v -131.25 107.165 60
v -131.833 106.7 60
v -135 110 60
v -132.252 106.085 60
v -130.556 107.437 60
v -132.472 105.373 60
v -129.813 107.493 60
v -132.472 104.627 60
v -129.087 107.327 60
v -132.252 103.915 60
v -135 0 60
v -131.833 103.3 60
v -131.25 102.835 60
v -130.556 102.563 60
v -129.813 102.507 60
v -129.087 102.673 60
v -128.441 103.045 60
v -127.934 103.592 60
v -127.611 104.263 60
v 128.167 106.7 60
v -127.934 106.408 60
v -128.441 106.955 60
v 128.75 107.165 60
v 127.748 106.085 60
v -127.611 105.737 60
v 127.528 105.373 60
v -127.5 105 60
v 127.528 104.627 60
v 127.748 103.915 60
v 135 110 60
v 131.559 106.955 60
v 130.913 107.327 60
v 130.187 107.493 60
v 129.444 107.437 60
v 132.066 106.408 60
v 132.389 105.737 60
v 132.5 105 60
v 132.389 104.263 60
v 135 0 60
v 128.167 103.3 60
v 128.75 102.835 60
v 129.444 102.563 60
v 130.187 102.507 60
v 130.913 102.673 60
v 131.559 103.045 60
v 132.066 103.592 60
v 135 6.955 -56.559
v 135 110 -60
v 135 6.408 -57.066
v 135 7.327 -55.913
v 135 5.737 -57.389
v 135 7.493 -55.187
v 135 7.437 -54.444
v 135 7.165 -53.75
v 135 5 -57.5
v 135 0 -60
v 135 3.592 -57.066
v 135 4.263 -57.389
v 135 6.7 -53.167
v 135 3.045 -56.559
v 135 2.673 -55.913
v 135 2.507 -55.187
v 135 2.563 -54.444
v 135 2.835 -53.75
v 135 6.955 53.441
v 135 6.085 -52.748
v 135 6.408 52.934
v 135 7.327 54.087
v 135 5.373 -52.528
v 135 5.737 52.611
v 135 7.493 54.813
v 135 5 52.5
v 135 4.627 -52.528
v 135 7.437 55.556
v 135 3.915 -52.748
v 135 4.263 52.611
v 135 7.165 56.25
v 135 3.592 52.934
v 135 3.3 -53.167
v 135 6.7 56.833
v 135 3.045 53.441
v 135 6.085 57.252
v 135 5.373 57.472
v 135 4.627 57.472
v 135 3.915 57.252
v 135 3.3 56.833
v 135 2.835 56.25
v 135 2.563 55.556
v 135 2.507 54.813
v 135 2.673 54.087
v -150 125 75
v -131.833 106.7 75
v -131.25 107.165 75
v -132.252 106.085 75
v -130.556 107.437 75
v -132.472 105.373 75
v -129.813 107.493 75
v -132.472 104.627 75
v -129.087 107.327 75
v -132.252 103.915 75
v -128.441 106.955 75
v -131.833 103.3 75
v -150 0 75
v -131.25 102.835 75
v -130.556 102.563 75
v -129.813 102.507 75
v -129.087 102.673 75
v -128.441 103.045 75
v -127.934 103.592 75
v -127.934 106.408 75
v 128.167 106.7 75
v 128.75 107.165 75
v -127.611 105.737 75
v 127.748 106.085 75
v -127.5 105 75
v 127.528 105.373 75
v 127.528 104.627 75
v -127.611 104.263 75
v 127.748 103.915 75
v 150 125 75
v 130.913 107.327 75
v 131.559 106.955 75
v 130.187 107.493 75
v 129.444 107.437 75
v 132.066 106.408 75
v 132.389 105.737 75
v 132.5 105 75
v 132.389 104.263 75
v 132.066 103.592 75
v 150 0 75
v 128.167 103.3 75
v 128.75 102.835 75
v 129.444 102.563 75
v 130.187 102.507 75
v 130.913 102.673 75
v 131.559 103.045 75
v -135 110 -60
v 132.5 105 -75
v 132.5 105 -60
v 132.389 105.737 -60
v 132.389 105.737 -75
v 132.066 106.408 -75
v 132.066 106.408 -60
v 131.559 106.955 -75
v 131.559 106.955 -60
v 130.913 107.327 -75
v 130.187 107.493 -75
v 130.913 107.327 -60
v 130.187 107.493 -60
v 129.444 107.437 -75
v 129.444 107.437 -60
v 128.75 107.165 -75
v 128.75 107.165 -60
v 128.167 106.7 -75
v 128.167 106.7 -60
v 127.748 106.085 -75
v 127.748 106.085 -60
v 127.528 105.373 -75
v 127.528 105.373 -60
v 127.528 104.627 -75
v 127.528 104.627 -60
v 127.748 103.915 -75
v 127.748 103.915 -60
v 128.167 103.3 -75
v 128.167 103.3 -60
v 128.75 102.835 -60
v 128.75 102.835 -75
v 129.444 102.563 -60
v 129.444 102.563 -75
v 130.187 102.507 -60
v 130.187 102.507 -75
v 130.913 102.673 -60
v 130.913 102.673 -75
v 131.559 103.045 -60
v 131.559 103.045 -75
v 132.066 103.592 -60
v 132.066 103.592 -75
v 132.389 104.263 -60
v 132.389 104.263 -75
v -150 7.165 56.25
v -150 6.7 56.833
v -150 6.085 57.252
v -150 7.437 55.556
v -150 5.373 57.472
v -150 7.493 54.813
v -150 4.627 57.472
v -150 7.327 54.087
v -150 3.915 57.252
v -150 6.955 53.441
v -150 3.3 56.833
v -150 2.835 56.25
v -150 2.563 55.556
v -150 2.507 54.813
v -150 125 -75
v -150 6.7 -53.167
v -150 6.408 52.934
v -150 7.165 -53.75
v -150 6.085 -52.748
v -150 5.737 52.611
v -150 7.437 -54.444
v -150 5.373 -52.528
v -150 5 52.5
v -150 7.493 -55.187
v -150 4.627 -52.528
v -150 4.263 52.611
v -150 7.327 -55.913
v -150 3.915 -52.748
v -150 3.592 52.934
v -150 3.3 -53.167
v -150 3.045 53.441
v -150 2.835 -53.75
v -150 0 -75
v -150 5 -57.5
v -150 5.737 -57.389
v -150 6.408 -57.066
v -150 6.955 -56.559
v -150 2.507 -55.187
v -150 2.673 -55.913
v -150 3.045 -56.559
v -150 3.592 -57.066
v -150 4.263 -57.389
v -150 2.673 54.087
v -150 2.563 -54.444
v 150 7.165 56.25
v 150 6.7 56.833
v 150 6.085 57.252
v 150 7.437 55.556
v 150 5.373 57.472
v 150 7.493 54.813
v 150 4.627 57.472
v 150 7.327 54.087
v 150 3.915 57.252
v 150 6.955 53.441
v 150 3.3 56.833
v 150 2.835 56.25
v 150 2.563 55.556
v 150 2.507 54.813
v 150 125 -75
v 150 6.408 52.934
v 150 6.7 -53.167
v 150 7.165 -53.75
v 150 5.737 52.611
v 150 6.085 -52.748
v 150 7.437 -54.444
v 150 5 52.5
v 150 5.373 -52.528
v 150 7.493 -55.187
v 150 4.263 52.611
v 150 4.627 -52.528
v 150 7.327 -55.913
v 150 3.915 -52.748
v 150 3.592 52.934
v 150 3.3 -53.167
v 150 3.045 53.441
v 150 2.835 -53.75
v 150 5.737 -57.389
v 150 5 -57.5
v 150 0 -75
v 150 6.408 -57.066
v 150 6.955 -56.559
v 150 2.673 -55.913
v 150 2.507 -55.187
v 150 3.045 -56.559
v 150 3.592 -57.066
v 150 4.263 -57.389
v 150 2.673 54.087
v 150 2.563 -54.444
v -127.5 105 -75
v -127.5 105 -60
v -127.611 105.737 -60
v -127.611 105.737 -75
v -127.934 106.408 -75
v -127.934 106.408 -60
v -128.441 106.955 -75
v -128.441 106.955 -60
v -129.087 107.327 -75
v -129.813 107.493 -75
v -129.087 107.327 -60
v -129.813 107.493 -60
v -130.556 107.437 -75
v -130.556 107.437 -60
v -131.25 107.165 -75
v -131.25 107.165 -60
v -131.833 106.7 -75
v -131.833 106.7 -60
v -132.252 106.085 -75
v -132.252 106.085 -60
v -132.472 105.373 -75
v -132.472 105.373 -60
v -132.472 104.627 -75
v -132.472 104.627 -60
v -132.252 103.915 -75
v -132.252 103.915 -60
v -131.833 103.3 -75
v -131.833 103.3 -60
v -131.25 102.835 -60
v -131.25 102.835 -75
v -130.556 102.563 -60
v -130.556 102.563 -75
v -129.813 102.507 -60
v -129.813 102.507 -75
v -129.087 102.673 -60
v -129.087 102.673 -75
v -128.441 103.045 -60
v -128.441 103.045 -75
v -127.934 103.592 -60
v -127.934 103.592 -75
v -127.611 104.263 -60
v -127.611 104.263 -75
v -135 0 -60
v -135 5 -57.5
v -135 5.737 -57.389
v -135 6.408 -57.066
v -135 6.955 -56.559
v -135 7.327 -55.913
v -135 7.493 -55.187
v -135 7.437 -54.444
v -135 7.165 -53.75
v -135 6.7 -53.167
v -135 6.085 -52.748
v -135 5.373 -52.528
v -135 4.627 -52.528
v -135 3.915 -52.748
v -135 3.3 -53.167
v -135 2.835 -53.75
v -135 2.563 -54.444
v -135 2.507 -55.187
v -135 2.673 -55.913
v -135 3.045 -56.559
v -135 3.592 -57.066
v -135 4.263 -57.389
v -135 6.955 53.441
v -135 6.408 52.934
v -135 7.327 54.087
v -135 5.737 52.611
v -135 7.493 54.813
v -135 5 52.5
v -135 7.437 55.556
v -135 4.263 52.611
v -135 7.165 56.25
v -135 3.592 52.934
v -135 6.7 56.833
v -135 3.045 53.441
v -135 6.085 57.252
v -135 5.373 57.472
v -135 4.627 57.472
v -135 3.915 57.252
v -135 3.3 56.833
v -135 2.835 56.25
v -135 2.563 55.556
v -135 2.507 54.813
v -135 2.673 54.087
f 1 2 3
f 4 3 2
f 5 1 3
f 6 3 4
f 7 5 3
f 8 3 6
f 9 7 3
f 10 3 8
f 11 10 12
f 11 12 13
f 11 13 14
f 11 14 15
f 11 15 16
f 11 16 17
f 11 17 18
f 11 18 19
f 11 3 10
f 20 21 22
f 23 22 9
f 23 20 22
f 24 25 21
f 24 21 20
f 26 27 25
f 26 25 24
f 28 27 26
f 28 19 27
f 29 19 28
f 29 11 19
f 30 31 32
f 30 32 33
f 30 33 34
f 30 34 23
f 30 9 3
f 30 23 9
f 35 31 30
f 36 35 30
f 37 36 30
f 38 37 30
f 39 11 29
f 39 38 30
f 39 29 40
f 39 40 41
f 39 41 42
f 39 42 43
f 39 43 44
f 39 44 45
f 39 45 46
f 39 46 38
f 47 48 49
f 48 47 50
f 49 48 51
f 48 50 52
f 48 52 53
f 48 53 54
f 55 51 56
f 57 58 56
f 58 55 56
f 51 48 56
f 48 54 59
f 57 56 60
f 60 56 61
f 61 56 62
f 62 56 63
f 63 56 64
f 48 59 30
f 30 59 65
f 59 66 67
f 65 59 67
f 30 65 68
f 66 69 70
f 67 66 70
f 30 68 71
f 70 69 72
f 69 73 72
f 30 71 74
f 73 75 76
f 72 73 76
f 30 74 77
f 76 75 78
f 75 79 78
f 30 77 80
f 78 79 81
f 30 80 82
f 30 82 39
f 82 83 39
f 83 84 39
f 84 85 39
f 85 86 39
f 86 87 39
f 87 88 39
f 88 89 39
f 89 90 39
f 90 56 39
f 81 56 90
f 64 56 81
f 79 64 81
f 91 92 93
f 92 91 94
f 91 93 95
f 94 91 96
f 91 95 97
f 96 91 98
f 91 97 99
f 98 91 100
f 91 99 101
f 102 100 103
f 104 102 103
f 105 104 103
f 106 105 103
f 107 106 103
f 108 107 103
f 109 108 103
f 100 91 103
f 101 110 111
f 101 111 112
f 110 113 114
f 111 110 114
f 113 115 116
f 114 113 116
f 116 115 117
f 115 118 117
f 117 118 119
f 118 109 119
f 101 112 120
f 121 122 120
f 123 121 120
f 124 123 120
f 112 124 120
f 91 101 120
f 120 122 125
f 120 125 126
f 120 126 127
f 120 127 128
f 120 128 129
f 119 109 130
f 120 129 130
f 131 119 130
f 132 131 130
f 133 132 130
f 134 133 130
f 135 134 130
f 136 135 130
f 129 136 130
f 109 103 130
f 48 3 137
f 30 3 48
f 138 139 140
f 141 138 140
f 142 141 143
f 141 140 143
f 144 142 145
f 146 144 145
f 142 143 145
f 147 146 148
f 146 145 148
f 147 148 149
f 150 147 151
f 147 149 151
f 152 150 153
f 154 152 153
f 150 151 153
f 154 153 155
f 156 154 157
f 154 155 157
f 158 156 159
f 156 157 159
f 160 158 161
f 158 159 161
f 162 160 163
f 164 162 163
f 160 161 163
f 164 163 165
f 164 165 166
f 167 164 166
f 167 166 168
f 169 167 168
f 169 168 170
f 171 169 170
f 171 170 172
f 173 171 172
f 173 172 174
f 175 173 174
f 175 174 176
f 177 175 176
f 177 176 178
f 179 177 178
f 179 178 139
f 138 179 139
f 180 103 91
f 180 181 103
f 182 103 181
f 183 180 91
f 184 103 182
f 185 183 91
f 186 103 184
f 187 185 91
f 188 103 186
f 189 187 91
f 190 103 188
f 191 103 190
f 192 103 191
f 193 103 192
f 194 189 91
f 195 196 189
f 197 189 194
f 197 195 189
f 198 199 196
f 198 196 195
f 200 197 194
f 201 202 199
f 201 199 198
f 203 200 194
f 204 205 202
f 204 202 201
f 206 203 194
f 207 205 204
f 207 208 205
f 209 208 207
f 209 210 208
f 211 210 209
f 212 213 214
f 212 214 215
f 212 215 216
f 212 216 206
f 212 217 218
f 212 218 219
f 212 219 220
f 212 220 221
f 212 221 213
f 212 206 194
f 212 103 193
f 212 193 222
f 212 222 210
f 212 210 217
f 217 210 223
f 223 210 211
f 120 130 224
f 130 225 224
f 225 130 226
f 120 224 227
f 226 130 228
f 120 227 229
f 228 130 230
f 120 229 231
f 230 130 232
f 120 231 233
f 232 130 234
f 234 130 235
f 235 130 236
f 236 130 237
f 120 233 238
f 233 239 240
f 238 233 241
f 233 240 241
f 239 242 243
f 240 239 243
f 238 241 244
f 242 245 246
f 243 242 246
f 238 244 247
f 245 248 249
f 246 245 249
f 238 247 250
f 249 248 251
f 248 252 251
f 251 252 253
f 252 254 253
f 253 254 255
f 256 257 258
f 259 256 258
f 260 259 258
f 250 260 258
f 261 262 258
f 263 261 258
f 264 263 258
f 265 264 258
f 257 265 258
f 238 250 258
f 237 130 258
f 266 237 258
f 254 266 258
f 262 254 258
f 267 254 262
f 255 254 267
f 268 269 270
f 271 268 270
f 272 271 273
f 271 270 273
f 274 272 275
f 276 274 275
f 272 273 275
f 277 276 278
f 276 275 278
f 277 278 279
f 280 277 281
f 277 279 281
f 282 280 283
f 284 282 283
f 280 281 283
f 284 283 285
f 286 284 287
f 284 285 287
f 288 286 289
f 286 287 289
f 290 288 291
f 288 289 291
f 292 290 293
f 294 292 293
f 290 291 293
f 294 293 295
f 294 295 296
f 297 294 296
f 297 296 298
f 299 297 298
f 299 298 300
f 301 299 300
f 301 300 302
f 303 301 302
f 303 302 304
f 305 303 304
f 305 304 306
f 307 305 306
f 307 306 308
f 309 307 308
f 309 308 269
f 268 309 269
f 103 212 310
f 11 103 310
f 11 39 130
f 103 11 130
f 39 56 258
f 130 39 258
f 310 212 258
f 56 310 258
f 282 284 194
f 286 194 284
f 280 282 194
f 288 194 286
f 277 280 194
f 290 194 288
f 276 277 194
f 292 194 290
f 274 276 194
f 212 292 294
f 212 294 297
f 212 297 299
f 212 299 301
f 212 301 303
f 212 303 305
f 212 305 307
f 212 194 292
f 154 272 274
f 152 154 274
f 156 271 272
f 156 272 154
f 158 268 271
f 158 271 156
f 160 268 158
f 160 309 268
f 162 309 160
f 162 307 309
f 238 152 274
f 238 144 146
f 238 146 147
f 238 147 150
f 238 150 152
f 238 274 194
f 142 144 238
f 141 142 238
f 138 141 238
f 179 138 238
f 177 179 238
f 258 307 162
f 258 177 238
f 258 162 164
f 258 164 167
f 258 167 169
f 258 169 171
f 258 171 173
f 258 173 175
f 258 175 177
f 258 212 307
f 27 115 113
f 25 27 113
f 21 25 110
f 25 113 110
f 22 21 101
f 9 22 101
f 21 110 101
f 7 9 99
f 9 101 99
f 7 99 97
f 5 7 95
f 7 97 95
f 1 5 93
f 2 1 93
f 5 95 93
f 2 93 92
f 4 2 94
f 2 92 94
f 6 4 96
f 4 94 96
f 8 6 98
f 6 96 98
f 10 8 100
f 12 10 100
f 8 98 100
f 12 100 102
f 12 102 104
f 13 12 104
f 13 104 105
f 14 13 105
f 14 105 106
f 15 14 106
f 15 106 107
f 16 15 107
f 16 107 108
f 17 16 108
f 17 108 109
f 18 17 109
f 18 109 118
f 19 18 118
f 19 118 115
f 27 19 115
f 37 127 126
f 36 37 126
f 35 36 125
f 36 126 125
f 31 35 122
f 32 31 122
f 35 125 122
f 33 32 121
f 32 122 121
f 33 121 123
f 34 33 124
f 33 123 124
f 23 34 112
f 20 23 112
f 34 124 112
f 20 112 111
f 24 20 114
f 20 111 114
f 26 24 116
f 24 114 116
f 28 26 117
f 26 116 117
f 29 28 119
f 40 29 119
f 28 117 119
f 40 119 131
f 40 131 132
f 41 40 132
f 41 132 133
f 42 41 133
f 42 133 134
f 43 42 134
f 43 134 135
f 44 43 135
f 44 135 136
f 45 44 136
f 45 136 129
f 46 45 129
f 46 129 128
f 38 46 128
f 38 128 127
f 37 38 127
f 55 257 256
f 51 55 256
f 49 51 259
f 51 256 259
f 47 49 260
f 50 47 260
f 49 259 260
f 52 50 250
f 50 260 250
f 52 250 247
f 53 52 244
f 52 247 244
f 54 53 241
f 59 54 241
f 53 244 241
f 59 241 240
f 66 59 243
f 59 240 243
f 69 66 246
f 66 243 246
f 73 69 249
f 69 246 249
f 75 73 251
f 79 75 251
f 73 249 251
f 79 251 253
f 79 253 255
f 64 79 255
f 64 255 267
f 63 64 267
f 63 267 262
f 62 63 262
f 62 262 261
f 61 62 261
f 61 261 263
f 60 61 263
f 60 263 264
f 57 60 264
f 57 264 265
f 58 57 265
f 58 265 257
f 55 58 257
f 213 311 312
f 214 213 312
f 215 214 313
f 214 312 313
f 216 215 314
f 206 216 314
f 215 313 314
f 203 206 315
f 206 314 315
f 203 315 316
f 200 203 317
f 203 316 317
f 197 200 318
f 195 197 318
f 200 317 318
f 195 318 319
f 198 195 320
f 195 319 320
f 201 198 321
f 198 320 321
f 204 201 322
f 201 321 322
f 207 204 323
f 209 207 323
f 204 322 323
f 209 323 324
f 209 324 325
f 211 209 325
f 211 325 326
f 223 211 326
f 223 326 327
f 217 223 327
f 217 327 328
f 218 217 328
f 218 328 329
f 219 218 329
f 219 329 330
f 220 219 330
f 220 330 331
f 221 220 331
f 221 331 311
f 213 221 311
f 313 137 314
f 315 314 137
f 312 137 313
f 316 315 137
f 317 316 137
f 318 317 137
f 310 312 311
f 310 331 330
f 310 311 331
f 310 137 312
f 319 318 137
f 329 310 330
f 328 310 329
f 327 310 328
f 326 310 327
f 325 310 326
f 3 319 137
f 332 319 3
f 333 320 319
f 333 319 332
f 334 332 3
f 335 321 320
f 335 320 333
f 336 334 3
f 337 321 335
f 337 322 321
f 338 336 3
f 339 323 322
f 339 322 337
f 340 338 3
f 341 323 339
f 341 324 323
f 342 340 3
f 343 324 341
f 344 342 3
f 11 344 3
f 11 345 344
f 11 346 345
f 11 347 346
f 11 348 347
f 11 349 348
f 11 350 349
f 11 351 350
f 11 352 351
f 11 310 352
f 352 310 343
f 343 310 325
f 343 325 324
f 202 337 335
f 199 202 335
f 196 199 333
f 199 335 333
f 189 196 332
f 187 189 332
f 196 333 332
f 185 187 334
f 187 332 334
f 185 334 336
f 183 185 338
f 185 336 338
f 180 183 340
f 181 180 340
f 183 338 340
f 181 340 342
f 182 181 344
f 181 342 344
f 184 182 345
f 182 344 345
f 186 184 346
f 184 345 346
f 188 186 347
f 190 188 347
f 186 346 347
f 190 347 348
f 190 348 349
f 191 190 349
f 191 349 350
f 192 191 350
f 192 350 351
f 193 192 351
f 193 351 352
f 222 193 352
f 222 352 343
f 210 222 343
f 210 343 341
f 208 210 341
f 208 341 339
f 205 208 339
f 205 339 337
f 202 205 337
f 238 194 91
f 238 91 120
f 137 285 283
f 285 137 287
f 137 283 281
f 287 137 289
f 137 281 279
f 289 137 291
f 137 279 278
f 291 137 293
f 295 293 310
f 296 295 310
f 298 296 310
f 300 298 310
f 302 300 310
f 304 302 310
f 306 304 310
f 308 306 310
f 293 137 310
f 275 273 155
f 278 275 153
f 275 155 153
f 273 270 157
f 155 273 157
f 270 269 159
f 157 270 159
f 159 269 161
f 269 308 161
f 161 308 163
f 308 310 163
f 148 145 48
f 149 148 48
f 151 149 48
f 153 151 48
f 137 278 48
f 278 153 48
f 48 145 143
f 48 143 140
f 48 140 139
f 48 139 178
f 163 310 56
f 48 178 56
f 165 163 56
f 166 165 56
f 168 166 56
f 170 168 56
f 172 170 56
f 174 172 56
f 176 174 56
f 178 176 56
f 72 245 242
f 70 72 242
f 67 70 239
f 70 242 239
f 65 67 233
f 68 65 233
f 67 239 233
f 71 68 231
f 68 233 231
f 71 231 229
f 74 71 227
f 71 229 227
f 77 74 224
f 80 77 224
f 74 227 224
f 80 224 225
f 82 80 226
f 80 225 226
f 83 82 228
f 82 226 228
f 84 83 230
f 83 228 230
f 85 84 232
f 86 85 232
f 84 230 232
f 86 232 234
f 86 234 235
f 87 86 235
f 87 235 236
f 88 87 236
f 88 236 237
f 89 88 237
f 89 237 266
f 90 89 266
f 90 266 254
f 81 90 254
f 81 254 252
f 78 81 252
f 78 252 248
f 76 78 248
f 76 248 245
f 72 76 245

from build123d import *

# Parameters (mm, degrees)
SKETCH1_W           = 300
SKETCH1_H           = 150
BOSS_EXTRUDE1_DEPTH = 125
SKETCH2_W           = 270
SKETCH2_H           = 120
CUT_EXTRUDE1_DEPTH  = 110
SKETCH4_R           = 2.5
CUT_EXTRUDE5_DEPTH  = 350
SKETCH6_R           = 2.5
CUT_EXTRUDE6_DEPTH  = 175


with BuildPart() as part:
    # Sketch1 → Boss-Extrude1 (new body)
    with BuildSketch(Plane(origin=(0, 0, 0), x_dir=(1, 0, 0), z_dir=(0, 1, 0))):
        Rectangle(SKETCH1_W, SKETCH1_H)
    extrude(amount=BOSS_EXTRUDE1_DEPTH)

    # Sketch2 → Cut-Extrude1 (cut)
    with BuildSketch(Plane.XZ):
        Rectangle(SKETCH2_W, SKETCH2_H)
    extrude(amount=-CUT_EXTRUDE1_DEPTH, mode=Mode.SUBTRACT)

    # Sketch4 → Cut-Extrude5 (cut)
    with BuildSketch(Plane(origin=(150, 0, 0), x_dir=(0, 0, -1), z_dir=(1, 0, 0))):
        with Locations((-55, 5)):
            Circle(SKETCH4_R)
        with Locations((55, 5)):
            Circle(SKETCH4_R)
    extrude(amount=-CUT_EXTRUDE5_DEPTH, mode=Mode.SUBTRACT)

    # Sketch6 → Cut-Extrude6 (cut)
    with BuildSketch(Plane.XY.offset(75)):
        with Locations((-130, 105)):
            Circle(SKETCH6_R)
        with Locations((130, 105)):
            Circle(SKETCH6_R)
    extrude(amount=-CUT_EXTRUDE6_DEPTH, mode=Mode.SUBTRACT)


solid = part.part
